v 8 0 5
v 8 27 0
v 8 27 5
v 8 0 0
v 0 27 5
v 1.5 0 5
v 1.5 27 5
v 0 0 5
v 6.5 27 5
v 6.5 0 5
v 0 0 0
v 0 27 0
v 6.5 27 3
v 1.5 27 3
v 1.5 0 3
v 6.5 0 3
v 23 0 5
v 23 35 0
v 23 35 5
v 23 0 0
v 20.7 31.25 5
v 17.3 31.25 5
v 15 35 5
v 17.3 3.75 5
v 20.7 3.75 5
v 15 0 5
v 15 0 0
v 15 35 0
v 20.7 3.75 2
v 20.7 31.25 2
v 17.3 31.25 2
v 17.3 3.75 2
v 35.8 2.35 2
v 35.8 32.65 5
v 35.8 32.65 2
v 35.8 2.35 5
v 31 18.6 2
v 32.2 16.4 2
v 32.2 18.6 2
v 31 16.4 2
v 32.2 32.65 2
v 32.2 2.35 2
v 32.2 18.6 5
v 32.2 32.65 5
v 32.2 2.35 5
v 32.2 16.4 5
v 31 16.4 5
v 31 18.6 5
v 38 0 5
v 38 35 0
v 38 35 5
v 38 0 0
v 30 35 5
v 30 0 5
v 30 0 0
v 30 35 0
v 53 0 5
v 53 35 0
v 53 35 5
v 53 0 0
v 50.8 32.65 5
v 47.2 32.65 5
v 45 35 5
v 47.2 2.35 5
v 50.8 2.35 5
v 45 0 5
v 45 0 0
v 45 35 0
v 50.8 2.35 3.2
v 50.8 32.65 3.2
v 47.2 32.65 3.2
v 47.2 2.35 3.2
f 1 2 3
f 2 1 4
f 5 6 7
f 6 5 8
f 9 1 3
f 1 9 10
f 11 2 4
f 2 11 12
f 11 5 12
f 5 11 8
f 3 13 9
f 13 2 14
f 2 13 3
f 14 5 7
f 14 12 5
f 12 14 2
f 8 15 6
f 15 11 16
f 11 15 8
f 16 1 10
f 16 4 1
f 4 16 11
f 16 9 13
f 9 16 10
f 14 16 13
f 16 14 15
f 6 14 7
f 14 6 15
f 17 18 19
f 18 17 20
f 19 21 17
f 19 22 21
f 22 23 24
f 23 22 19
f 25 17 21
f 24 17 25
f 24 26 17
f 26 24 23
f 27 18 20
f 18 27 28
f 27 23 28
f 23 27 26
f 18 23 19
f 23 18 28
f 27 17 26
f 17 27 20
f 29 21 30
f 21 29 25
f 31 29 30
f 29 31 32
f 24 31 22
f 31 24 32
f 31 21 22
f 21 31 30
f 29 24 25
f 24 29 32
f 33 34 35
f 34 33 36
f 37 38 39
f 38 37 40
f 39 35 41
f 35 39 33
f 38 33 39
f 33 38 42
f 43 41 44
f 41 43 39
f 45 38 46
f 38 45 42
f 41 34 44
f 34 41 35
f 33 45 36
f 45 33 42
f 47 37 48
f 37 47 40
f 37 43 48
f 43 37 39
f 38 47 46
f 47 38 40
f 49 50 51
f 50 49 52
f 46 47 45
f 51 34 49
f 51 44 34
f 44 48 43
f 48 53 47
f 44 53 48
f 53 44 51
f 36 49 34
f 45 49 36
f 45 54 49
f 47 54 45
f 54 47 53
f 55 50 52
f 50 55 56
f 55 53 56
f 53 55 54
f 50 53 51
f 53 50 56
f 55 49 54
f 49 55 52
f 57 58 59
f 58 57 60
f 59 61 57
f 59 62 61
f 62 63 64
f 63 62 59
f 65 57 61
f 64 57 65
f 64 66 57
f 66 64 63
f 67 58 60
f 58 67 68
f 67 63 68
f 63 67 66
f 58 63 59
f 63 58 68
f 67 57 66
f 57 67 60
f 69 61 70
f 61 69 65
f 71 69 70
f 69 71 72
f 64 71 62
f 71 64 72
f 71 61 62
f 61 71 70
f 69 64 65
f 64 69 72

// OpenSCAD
//
// top crimp for Harting 40p connector
//
e = 0.1;
$fn = 32;
mm = 25.4;

slot_w = 5;
slot_d = 2;

body_w = 8;
body_l = 27;
body_d = 5;

extra_l = 35;

bslot_w = 3.4;
bslot_l = 27.5;
bslot_d = 3;

module top() {
  difference() {
    cube( [body_w, body_l, body_d]);
    translate( [(body_w-slot_w)/2, -e, body_d-slot_d])
      cube( [slot_w, body_l+2*e, slot_d+2*e]);
  }
}

module bot() {
  difference() {
    cube( [body_w, extra_l, body_d]);
    translate( [(body_w-bslot_w)/2, (extra_l-bslot_l)/2, body_d-bslot_d])
      cube( [bslot_w, bslot_l, bslot_d+2*e]);
  }
}

sbot_w = 3.6;
sbot_l = 30.3;
sbot_d = 3;

key_w = 1.2;
key_h = 2.2;

module sbot() {
  difference() {
    cube( [body_w, extra_l, body_d]);
    translate( [(body_w-sbot_w)/2, (extra_l-sbot_l)/2, body_d-sbot_d]) {
      cube( [sbot_w, sbot_l, sbot_d+e]);
      translate( [-key_w, (sbot_l/2)-key_h/2, 0])
	cube( [key_w+e, key_h, sbot_d+e]);
    }
  }
}

stop_d = 1.8;

module stop() {
  difference() {
    cube( [body_w, extra_l, body_d]);
    translate( [(body_w-sbot_w)/2, (extra_l-sbot_l)/2, body_d-stop_d]) {
      cube( [sbot_w, sbot_l, stop_d+e]);
    }
  }
}


top();
translate( [15, 0, 0]) bot();
translate( [30, 0, 0]) sbot();
translate( [45, 0, 0]) stop();
